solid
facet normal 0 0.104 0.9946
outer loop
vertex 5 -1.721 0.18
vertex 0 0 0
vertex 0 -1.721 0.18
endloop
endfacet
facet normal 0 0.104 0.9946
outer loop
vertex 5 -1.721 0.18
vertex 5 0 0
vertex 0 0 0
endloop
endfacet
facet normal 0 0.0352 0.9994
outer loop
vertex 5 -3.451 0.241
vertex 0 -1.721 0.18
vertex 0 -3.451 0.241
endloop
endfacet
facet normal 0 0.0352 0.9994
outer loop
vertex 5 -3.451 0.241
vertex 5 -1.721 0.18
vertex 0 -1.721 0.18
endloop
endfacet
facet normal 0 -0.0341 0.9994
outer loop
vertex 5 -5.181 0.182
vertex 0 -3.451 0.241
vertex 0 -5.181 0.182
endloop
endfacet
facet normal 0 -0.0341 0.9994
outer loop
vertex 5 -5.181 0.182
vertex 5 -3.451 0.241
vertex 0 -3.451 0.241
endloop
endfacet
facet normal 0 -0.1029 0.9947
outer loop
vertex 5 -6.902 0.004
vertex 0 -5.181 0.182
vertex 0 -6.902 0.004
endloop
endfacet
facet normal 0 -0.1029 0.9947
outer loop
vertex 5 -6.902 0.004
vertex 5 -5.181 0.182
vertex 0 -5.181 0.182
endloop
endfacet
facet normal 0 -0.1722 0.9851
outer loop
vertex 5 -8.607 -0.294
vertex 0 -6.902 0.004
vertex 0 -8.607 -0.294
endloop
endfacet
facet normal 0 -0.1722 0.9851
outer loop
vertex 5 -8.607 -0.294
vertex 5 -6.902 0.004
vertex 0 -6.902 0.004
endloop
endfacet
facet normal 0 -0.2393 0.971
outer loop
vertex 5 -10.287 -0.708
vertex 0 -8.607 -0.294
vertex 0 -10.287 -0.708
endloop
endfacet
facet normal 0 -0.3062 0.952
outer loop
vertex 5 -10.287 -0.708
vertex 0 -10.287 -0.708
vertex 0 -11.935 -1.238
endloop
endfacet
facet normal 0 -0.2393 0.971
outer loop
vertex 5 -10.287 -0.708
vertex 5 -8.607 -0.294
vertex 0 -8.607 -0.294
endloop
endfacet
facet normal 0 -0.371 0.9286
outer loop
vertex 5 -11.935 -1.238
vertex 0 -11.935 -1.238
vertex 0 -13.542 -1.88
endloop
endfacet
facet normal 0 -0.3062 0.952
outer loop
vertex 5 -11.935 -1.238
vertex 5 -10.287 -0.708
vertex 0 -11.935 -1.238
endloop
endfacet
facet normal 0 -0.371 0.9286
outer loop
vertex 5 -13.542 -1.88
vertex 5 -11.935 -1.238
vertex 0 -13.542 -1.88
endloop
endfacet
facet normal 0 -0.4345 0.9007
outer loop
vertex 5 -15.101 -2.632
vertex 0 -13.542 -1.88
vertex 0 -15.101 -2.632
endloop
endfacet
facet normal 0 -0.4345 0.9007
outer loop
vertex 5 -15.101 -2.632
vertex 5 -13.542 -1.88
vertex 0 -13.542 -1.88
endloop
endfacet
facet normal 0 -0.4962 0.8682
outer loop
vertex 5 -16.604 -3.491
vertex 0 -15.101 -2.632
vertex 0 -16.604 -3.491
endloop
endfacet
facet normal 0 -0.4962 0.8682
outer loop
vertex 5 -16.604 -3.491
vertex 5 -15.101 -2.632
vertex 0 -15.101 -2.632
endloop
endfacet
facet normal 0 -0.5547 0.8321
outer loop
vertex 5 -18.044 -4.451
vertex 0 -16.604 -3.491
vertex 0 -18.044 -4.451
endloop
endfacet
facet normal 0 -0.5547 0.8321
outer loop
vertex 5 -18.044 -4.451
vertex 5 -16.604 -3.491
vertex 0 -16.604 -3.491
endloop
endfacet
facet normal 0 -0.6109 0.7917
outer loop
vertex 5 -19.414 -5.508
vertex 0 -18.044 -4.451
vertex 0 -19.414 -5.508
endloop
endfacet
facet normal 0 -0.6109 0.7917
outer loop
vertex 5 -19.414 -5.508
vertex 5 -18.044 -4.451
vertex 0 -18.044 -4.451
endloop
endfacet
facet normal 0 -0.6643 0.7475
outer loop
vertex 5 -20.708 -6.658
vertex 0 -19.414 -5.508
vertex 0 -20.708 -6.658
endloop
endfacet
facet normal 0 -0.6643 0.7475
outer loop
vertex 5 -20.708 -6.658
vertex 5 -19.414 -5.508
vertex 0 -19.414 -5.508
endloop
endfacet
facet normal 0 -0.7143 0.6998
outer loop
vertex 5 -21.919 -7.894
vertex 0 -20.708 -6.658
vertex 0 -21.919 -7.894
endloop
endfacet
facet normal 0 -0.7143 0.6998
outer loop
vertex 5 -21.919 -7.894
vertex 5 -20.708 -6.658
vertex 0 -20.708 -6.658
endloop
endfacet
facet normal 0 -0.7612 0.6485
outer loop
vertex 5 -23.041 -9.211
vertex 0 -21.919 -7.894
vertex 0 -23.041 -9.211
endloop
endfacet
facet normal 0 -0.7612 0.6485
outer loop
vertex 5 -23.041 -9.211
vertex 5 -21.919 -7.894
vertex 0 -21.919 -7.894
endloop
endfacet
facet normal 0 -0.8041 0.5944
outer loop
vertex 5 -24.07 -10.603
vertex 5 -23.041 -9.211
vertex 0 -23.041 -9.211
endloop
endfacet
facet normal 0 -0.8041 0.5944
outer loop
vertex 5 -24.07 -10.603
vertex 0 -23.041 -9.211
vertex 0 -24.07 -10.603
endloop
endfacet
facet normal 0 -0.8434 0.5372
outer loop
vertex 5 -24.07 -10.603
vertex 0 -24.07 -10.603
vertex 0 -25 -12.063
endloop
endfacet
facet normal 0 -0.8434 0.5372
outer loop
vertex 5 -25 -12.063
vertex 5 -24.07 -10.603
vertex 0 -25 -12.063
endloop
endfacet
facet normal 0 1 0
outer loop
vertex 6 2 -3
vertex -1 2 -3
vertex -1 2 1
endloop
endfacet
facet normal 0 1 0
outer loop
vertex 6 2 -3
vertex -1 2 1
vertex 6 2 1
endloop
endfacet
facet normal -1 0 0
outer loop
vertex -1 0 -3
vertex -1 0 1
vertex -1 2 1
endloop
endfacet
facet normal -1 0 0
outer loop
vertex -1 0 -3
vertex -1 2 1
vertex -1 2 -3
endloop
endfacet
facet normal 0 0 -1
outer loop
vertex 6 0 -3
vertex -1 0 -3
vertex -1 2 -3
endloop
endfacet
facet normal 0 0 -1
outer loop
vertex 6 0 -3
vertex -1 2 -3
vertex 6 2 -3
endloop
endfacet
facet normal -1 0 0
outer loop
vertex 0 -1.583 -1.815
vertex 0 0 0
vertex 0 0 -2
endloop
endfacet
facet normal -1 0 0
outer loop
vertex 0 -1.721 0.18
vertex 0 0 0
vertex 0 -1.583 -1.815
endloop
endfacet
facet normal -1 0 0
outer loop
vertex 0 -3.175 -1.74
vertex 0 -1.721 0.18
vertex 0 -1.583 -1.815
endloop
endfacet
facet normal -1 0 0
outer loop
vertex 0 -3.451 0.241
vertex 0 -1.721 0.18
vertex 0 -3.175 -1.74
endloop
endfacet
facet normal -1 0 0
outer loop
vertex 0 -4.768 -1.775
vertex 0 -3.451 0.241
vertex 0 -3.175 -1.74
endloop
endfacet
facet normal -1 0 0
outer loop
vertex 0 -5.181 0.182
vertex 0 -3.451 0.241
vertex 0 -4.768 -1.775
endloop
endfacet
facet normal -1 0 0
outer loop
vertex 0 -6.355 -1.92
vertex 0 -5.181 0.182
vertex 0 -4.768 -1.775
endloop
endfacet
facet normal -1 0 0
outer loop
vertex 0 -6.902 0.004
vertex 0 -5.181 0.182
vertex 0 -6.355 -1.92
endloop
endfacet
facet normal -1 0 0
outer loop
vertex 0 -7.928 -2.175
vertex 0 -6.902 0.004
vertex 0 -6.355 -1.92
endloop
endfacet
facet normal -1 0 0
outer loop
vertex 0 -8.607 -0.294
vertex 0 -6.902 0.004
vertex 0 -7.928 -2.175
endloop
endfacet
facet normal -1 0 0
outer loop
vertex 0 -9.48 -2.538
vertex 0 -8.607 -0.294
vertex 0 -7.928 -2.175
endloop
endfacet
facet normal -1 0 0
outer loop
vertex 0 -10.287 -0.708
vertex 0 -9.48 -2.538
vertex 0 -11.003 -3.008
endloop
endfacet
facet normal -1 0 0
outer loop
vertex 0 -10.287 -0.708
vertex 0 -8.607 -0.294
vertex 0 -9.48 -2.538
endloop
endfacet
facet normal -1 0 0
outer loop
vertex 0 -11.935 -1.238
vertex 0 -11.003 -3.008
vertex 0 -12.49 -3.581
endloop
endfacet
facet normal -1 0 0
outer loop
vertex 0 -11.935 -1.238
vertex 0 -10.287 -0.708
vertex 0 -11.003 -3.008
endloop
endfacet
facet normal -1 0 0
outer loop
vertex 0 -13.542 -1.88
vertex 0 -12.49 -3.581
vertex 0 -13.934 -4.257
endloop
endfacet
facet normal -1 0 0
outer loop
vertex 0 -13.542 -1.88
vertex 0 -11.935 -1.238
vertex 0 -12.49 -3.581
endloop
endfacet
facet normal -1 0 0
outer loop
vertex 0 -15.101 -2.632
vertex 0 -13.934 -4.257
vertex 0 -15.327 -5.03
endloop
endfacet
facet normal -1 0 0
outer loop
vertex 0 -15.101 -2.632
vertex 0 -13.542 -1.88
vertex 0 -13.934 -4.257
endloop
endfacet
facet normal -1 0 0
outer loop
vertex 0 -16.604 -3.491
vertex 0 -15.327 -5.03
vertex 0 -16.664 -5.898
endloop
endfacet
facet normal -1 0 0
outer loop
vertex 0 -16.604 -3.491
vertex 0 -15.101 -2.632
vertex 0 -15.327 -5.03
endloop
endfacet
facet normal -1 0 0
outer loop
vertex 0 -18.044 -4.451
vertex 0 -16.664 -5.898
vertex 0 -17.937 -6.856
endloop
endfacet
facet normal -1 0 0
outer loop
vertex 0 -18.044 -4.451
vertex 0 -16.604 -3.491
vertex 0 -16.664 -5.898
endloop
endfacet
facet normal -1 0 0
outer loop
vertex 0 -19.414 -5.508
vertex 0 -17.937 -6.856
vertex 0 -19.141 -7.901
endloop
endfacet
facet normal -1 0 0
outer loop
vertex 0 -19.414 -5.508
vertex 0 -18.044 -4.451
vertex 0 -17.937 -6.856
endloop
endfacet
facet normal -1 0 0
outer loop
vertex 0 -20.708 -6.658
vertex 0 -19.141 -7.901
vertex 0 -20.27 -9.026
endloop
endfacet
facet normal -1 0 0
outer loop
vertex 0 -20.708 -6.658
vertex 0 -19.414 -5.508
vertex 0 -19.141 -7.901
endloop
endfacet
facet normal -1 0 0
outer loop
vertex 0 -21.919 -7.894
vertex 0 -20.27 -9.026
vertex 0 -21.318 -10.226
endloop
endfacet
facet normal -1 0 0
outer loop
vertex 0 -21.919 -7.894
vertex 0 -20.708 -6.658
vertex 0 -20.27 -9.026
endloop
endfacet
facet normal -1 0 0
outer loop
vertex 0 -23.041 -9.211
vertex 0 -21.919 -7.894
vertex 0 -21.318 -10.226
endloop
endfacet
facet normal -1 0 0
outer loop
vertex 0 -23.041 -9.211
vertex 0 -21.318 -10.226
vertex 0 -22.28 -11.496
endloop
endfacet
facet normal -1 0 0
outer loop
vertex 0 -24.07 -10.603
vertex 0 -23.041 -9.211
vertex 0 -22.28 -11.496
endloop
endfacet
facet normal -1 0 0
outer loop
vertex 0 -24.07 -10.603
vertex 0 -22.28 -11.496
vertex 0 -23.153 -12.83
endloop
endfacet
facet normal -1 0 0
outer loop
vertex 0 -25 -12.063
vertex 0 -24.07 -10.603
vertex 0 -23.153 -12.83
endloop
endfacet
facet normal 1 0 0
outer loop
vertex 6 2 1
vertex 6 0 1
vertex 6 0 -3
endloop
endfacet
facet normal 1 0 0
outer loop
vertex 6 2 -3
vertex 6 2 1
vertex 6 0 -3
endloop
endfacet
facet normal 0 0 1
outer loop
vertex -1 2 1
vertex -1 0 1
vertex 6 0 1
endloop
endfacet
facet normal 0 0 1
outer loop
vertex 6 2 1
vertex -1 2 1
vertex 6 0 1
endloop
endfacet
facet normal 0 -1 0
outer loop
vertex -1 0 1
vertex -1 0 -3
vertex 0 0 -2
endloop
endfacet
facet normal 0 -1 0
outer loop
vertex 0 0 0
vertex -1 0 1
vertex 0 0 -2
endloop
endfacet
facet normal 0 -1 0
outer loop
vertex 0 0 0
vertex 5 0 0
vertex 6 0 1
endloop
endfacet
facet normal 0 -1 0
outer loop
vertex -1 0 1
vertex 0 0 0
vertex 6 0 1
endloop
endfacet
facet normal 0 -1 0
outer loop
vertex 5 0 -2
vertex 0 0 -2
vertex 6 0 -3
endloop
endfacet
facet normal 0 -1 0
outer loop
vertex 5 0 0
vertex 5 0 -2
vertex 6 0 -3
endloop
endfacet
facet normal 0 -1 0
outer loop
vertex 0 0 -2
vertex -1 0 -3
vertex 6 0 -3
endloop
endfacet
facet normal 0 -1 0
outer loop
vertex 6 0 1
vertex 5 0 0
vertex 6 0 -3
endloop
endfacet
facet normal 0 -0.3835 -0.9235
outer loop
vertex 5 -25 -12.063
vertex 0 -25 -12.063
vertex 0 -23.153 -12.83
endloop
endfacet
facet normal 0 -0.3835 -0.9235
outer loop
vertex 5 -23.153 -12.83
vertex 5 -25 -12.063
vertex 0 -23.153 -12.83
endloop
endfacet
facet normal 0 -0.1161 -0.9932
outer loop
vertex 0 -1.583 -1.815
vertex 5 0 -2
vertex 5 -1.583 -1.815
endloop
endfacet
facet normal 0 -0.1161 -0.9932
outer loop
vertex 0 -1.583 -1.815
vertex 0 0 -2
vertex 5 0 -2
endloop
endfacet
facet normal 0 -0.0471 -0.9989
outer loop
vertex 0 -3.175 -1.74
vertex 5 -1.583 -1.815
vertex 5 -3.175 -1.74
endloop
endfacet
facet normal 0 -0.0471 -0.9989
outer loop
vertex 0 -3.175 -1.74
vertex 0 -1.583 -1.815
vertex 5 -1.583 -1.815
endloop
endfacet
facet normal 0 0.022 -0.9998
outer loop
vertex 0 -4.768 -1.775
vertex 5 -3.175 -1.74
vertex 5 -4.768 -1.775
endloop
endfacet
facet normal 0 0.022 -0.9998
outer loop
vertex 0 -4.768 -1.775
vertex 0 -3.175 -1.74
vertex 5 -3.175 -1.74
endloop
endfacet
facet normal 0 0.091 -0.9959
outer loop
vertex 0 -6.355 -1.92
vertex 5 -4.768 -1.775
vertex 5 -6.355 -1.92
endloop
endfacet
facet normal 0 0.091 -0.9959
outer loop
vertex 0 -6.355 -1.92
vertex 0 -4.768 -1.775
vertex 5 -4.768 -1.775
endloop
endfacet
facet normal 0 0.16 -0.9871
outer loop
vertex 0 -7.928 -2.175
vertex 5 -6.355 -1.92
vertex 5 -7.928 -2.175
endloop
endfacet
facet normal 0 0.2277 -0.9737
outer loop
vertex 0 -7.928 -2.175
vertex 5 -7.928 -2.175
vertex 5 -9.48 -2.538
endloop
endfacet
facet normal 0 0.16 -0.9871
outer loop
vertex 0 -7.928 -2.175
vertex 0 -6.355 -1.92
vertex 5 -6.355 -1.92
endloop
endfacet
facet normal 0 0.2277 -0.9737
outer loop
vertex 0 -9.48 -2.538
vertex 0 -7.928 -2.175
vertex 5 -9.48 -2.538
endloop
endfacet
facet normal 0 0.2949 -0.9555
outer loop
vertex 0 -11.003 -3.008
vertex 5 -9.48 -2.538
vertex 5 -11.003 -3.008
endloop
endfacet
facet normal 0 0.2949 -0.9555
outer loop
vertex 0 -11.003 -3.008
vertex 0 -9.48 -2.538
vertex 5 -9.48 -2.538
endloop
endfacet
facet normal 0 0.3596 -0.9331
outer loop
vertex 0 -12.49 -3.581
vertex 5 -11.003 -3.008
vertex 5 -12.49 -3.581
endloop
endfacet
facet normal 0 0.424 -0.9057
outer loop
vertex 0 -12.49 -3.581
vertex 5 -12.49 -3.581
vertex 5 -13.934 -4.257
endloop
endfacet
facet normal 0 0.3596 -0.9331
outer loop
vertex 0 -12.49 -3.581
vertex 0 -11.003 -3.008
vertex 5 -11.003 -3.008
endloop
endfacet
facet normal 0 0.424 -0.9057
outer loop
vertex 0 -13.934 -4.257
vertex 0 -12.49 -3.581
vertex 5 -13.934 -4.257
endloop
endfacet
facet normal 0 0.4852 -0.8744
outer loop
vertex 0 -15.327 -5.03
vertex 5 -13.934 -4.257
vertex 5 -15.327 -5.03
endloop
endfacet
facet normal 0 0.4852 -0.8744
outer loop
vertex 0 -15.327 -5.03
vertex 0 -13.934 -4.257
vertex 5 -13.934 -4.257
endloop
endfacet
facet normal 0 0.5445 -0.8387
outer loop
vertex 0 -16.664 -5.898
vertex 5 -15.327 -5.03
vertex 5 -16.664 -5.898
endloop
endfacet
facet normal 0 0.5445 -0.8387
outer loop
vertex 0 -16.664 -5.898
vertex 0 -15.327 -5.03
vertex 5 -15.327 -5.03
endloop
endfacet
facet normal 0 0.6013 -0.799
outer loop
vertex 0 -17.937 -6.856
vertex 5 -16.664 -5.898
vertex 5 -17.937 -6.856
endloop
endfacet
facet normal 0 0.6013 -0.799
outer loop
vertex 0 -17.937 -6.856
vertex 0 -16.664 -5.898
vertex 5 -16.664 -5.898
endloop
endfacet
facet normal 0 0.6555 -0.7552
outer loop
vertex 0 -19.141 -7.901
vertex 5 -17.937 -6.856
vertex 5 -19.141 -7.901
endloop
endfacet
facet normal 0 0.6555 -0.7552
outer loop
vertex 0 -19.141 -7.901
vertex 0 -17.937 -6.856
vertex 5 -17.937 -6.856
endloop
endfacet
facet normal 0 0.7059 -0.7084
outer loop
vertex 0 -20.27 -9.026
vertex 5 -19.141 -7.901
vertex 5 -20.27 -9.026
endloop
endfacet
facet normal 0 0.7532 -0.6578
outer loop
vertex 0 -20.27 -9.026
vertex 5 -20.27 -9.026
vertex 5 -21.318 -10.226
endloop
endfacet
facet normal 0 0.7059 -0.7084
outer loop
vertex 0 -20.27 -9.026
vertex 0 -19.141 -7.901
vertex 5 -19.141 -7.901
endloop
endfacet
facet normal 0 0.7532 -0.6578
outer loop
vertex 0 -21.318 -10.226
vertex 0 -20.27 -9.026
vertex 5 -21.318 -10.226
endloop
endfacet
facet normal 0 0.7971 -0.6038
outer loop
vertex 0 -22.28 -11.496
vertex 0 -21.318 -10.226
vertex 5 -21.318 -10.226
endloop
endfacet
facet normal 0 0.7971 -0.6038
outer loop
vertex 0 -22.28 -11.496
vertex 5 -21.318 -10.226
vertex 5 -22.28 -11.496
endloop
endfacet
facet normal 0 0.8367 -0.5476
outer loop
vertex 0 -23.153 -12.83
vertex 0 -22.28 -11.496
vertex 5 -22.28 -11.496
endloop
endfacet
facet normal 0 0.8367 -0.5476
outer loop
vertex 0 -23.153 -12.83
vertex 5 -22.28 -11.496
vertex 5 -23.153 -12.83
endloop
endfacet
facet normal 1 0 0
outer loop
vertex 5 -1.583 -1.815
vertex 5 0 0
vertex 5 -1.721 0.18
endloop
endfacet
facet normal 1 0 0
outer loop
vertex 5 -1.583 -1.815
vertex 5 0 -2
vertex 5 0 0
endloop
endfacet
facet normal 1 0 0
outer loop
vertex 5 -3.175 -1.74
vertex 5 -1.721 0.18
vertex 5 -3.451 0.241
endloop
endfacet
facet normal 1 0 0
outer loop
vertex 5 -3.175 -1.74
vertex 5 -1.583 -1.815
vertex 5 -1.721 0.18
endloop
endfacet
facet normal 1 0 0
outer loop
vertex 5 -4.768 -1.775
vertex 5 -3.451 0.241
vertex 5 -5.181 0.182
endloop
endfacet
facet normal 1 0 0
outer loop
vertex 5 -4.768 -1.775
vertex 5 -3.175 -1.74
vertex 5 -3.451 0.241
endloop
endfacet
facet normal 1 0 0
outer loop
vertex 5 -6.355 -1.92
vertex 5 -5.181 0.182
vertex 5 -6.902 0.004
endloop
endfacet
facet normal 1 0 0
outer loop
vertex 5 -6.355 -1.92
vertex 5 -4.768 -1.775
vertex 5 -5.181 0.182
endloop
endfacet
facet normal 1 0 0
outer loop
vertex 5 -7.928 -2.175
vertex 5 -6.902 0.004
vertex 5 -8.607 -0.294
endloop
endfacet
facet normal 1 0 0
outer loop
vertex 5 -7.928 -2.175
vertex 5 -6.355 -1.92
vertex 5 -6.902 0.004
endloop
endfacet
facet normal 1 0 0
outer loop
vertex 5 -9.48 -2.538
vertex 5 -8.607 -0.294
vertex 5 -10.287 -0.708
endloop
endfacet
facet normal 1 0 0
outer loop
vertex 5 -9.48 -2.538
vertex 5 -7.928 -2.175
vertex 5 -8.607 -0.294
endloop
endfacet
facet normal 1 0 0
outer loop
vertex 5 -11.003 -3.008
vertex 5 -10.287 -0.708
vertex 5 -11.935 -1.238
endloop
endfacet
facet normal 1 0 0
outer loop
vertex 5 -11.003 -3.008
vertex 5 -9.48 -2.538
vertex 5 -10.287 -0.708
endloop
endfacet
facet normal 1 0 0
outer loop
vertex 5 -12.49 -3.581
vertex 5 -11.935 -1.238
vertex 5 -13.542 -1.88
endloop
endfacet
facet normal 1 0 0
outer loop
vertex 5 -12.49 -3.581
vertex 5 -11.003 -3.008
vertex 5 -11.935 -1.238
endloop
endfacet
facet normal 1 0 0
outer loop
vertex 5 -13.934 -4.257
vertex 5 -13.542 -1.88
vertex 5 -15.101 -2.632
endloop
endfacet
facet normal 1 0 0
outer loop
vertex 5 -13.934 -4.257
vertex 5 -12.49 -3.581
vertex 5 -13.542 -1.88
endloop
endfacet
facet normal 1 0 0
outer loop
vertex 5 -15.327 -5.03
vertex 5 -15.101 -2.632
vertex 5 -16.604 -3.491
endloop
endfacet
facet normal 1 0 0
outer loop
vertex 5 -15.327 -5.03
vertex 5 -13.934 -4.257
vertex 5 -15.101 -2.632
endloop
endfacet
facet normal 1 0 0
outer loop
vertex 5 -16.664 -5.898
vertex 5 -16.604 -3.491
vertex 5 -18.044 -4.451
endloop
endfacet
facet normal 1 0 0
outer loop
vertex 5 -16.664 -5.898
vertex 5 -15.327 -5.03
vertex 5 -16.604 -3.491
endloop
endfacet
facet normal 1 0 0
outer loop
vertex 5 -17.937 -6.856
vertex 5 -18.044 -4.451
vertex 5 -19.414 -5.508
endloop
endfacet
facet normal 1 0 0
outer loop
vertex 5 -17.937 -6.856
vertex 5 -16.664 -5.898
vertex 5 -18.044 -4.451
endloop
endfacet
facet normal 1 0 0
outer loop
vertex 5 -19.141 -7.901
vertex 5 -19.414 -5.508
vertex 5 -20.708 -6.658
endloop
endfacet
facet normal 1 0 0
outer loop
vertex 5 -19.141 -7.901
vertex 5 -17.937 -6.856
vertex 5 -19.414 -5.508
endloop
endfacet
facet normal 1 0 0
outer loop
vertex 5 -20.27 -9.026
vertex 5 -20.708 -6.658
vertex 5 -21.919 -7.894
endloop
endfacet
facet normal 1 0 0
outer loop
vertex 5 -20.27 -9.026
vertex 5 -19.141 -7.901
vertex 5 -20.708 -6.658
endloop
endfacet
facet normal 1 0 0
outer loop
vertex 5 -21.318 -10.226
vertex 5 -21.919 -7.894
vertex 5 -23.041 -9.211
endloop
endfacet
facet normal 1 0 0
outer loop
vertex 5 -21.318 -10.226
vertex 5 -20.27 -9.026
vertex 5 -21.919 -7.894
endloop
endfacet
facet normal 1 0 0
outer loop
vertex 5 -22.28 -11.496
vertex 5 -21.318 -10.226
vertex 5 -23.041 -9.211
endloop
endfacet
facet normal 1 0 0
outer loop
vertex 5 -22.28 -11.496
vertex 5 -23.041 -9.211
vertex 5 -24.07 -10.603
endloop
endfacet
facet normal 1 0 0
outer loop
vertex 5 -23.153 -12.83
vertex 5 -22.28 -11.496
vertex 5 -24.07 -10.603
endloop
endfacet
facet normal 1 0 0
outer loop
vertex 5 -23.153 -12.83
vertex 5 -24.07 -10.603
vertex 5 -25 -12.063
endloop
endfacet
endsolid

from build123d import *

# Parameters (mm, degrees)
IZIM1_W                     = 5
IZIM1_H                     = 2
IZIM3_W                     = 5
IZIM3_H                     = 2
IZIM3_W_2                   = 7
IZIM3_H_2                   = 4
Y_KSEKLIK_EKSTR_ZYON1_DEPTH = 2


with BuildPart() as part:
    # Süpür1: sweep along a path in Çizim2
    with BuildLine(Plane(origin=(0, 0, 0), x_dir=(0, 0, -1), z_dir=(1, 0, 0))) as s_p_r1_path:
        ThreePointArc((0, 0), (2.242898882, -14.32797835), (12.06275188, -25))
    # Çizim1 → Süpür1 (sweep)
    with BuildSketch(Plane(origin=(0, 0, 0), x_dir=(1, 0, 0), z_dir=(0, 1, 0))):
        with Locations((2.5, 1)):
            Rectangle(IZIM1_W, IZIM1_H)
    sweep(path=s_p_r1_path.line)

    # Çizim3 → Yükseklik-Ekstrüzyon1 (add)
    with BuildSketch(Plane(origin=(0, 0, 0), x_dir=(1, 0, 0), z_dir=(0, 1, 0))):
        with Locations((2.5, 1)):
            Rectangle(IZIM3_W, IZIM3_H)
        with Locations((2.5, 1)):
            Rectangle(IZIM3_W_2, IZIM3_H_2)
        with Locations((2.5, 1)):
            Rectangle(IZIM3_W, IZIM3_H, mode=Mode.SUBTRACT)
        with Locations((2.5, 1)):
            Rectangle(IZIM3_W, IZIM3_H)
    extrude(amount=Y_KSEKLIK_EKSTR_ZYON1_DEPTH)


solid = part.part
